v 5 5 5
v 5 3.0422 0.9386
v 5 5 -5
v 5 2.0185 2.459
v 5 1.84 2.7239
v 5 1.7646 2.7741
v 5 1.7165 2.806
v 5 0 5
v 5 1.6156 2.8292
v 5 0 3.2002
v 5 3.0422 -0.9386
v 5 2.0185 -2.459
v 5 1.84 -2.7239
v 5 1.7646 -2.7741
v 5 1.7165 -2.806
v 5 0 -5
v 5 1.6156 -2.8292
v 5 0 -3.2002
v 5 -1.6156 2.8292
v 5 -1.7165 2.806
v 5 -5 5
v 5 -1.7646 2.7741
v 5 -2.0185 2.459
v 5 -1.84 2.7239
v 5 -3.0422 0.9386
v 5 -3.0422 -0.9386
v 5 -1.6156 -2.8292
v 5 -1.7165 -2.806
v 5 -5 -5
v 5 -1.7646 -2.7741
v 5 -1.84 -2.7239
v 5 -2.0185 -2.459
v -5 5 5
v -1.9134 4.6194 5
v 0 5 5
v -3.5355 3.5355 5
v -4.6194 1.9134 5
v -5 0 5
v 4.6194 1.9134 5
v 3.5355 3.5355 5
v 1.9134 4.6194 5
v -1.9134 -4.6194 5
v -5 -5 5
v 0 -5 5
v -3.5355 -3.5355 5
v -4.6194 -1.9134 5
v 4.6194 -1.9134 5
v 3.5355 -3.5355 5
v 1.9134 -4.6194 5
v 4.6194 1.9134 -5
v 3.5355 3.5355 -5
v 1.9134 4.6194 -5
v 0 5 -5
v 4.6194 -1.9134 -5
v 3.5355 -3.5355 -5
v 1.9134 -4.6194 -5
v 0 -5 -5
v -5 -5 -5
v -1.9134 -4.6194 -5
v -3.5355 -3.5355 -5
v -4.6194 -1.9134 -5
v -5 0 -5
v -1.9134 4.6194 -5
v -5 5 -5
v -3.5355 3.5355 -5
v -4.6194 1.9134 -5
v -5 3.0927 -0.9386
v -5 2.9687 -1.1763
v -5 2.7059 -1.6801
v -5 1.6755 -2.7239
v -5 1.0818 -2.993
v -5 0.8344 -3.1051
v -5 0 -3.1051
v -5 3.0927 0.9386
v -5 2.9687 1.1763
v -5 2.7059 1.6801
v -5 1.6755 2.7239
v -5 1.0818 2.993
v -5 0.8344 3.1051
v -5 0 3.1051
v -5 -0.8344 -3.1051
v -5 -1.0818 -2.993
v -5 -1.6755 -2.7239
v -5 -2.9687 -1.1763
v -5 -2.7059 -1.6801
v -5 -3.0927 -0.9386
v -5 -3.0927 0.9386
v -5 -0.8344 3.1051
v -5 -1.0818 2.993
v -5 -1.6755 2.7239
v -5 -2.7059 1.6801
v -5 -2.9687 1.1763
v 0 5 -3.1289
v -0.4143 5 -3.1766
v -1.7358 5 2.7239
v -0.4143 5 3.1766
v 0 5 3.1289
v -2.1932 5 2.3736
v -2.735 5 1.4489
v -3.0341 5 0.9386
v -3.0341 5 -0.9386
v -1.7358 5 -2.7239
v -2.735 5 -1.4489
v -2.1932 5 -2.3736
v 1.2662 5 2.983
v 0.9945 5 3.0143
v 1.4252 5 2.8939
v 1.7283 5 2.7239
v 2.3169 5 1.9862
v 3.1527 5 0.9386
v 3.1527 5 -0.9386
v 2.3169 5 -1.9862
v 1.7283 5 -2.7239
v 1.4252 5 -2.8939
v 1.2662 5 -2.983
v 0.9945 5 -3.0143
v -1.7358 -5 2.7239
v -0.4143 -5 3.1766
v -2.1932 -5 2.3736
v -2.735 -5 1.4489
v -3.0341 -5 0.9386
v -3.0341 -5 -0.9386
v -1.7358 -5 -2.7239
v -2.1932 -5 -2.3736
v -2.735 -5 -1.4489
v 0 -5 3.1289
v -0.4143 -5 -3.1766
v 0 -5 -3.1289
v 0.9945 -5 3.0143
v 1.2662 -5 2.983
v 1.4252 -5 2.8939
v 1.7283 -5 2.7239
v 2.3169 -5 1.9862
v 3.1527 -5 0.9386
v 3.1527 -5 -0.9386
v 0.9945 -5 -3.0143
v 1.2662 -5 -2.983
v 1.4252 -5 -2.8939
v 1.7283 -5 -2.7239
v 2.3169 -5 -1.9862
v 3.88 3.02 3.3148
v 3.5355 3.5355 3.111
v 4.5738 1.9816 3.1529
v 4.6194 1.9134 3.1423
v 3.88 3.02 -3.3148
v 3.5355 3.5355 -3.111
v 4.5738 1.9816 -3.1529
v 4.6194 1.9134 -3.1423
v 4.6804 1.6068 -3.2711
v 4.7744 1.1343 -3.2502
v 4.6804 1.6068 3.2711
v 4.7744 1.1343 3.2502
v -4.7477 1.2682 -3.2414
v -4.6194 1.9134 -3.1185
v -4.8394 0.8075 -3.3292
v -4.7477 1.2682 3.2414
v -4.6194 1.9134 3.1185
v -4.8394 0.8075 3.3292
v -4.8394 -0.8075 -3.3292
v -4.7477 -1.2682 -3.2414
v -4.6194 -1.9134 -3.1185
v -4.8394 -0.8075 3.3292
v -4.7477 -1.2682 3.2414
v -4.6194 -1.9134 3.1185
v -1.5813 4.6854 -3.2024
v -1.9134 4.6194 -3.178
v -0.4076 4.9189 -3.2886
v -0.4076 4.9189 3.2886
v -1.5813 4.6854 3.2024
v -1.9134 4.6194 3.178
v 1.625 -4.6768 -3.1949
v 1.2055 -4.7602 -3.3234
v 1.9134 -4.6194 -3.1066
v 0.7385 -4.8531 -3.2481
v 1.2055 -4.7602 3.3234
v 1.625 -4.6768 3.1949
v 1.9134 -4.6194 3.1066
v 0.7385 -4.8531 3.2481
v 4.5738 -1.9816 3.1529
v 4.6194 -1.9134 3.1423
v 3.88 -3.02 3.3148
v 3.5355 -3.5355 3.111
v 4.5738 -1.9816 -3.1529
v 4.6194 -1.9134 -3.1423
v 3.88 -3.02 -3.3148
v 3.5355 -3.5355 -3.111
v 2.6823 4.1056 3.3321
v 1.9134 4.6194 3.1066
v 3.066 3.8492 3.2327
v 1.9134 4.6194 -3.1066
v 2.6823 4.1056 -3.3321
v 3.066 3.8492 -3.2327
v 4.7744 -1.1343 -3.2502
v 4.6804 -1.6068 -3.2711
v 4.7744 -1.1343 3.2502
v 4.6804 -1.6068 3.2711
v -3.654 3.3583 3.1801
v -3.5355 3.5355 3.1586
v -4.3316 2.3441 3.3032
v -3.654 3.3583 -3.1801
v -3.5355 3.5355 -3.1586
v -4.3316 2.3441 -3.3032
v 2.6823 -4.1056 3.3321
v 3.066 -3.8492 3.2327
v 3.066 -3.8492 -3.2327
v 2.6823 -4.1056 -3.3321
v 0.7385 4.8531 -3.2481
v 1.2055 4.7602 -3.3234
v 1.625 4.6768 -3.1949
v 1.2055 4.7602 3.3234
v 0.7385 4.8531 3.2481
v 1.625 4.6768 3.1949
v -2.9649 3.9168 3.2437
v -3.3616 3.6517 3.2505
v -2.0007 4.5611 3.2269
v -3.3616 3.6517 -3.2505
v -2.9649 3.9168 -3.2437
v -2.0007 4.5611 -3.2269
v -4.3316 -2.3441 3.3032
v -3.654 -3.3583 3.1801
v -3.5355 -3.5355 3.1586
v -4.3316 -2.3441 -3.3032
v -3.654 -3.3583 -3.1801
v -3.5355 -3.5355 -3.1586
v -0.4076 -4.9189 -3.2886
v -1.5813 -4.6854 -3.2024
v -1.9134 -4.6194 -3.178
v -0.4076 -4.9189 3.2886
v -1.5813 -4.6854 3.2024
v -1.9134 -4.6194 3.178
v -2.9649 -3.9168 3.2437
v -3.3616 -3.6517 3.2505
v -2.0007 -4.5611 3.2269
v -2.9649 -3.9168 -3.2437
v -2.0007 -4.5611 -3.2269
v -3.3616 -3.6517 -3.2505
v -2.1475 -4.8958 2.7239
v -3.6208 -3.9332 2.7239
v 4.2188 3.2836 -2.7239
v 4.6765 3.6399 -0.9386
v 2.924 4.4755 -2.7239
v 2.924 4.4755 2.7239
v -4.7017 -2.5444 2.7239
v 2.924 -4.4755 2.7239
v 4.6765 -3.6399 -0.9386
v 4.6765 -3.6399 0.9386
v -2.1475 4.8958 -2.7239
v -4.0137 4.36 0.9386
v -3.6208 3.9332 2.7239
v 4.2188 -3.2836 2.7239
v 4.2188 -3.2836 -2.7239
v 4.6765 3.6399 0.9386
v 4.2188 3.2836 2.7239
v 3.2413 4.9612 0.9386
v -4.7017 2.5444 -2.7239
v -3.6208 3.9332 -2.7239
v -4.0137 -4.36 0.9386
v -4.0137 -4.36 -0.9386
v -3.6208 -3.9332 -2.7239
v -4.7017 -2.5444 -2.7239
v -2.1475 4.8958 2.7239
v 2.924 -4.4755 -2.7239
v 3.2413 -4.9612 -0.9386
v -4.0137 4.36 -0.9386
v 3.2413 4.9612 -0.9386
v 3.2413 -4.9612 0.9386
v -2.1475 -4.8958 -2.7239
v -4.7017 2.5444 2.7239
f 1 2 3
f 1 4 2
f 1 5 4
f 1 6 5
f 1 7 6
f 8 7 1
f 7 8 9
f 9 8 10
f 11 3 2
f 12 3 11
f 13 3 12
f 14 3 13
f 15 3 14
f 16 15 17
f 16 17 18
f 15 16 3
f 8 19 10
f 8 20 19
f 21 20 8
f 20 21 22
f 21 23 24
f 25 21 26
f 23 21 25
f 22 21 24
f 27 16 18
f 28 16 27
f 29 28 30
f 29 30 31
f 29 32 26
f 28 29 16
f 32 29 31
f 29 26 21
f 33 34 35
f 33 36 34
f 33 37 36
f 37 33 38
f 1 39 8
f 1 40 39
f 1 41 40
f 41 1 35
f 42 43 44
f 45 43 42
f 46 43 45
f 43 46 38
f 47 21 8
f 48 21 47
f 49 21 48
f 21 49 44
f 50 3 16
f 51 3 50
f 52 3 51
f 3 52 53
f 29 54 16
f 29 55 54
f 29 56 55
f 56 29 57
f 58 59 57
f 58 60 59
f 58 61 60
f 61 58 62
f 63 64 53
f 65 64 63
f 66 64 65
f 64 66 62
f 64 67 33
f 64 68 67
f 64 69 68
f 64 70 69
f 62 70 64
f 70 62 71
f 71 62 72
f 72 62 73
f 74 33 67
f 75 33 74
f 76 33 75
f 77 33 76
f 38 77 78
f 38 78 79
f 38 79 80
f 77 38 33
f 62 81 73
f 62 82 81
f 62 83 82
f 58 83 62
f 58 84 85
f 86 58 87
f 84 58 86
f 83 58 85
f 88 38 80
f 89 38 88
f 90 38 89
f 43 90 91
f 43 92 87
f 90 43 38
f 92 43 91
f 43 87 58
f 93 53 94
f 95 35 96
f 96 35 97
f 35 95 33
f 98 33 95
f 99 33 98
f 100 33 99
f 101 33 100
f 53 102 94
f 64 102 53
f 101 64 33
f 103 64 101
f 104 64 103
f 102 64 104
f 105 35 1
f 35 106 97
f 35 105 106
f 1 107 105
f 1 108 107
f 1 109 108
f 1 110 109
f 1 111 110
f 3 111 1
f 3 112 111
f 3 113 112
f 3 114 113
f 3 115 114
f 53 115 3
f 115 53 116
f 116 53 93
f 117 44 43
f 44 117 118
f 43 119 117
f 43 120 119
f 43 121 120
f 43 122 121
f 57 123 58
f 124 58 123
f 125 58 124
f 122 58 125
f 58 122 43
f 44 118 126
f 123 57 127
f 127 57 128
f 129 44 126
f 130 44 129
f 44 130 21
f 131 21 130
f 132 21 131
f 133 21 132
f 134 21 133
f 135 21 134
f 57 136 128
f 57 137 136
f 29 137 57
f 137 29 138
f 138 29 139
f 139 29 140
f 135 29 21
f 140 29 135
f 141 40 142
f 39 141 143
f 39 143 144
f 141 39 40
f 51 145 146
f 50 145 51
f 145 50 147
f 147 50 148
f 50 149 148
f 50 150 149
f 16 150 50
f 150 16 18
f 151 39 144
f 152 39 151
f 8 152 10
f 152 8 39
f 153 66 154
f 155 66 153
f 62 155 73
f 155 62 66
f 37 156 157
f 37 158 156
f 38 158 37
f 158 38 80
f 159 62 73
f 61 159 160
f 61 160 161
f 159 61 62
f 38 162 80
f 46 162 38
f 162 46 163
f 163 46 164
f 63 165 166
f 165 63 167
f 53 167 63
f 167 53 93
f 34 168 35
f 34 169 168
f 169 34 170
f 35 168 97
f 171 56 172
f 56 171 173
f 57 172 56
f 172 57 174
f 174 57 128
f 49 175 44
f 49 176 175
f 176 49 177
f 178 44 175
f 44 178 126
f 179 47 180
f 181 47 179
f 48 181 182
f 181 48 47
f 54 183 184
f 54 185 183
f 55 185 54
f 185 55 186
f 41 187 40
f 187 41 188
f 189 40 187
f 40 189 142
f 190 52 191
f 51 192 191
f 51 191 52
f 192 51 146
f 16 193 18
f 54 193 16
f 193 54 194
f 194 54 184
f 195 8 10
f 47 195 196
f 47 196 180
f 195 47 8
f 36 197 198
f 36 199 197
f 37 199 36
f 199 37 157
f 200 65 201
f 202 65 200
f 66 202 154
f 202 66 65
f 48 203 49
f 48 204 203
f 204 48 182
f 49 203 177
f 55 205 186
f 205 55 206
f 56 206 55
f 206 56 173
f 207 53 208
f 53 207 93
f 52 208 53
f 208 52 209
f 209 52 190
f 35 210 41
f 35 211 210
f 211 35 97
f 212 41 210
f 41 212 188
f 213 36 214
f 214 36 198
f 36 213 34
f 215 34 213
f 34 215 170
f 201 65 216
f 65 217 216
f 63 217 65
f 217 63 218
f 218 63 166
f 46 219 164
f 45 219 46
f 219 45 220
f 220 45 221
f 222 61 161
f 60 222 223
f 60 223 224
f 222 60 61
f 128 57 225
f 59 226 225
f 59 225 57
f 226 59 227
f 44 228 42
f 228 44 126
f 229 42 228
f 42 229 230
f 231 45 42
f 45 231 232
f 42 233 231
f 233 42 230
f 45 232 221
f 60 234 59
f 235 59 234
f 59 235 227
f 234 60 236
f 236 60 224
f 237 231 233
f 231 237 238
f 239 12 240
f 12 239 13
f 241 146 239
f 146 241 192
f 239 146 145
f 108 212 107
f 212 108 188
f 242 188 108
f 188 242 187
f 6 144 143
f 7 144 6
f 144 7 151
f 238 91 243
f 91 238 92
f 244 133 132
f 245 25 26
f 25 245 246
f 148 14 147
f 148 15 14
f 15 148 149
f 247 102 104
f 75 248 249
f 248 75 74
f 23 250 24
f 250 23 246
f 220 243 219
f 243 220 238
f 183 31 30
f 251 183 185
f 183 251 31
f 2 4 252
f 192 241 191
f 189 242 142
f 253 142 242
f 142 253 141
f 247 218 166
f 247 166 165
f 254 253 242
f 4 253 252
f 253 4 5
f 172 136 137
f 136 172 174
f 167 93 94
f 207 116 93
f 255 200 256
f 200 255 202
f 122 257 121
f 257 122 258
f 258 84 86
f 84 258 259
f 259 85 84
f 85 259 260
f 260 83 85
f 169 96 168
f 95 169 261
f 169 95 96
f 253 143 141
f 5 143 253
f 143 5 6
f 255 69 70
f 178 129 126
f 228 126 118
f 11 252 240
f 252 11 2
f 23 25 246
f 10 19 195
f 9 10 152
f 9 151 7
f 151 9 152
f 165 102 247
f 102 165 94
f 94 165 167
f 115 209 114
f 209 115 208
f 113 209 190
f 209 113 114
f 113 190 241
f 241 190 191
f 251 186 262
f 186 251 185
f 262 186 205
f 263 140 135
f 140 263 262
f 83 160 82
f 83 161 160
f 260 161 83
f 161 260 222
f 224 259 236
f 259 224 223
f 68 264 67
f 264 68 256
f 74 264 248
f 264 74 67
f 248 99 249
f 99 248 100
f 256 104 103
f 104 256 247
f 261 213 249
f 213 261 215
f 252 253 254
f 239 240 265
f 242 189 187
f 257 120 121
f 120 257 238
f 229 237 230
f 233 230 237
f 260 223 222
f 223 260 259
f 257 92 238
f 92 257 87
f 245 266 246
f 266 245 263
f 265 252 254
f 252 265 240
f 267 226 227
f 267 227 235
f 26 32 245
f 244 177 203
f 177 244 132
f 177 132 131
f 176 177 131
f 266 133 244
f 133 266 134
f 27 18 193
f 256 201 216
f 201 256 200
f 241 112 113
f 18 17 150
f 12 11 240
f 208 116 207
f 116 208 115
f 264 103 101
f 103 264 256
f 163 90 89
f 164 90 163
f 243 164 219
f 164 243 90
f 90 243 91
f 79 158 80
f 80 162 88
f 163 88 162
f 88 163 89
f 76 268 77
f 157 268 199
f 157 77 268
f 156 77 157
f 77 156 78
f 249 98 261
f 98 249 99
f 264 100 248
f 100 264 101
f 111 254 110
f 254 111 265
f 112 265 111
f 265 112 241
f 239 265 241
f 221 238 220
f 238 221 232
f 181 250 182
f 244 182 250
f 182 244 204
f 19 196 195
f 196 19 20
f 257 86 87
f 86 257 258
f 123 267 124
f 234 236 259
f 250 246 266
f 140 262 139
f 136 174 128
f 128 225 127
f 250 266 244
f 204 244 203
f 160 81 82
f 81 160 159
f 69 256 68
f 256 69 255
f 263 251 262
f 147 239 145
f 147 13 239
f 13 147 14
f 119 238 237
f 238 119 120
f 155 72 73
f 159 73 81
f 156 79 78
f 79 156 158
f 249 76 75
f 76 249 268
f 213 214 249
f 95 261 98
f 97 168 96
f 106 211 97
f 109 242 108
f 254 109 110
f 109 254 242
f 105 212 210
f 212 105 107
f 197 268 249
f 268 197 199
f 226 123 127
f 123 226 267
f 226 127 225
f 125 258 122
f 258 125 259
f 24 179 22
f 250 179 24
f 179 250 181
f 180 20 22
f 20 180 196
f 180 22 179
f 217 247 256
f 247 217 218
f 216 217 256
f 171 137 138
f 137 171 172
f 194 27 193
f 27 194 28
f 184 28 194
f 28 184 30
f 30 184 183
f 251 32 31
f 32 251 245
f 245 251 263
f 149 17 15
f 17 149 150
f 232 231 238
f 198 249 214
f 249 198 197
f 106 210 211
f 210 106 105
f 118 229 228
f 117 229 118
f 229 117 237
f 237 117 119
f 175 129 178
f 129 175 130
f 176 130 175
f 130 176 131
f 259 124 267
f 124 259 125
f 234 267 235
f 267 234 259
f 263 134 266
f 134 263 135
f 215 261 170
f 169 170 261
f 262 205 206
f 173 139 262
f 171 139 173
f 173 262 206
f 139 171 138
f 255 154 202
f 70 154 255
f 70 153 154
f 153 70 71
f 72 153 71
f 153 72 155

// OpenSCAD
// Size of the cube (all directions)
cubSiz = 10;

//Diameter of the Cylinder
cyDia = 10;

//Height of the Cylinder
cyHei = 15;

//Radius of the Sphere
sRad = 6;

// You can subtract multiple shapes
// 2nd, 3rd, etc shape is subtracted from 1st shape
difference(){
    cube(size = [cubSiz, cubSiz, cubSiz], center = true);
    cylinder(d = cyDia, h = cyHei, center = true);
    sphere(r = sRad);
}
